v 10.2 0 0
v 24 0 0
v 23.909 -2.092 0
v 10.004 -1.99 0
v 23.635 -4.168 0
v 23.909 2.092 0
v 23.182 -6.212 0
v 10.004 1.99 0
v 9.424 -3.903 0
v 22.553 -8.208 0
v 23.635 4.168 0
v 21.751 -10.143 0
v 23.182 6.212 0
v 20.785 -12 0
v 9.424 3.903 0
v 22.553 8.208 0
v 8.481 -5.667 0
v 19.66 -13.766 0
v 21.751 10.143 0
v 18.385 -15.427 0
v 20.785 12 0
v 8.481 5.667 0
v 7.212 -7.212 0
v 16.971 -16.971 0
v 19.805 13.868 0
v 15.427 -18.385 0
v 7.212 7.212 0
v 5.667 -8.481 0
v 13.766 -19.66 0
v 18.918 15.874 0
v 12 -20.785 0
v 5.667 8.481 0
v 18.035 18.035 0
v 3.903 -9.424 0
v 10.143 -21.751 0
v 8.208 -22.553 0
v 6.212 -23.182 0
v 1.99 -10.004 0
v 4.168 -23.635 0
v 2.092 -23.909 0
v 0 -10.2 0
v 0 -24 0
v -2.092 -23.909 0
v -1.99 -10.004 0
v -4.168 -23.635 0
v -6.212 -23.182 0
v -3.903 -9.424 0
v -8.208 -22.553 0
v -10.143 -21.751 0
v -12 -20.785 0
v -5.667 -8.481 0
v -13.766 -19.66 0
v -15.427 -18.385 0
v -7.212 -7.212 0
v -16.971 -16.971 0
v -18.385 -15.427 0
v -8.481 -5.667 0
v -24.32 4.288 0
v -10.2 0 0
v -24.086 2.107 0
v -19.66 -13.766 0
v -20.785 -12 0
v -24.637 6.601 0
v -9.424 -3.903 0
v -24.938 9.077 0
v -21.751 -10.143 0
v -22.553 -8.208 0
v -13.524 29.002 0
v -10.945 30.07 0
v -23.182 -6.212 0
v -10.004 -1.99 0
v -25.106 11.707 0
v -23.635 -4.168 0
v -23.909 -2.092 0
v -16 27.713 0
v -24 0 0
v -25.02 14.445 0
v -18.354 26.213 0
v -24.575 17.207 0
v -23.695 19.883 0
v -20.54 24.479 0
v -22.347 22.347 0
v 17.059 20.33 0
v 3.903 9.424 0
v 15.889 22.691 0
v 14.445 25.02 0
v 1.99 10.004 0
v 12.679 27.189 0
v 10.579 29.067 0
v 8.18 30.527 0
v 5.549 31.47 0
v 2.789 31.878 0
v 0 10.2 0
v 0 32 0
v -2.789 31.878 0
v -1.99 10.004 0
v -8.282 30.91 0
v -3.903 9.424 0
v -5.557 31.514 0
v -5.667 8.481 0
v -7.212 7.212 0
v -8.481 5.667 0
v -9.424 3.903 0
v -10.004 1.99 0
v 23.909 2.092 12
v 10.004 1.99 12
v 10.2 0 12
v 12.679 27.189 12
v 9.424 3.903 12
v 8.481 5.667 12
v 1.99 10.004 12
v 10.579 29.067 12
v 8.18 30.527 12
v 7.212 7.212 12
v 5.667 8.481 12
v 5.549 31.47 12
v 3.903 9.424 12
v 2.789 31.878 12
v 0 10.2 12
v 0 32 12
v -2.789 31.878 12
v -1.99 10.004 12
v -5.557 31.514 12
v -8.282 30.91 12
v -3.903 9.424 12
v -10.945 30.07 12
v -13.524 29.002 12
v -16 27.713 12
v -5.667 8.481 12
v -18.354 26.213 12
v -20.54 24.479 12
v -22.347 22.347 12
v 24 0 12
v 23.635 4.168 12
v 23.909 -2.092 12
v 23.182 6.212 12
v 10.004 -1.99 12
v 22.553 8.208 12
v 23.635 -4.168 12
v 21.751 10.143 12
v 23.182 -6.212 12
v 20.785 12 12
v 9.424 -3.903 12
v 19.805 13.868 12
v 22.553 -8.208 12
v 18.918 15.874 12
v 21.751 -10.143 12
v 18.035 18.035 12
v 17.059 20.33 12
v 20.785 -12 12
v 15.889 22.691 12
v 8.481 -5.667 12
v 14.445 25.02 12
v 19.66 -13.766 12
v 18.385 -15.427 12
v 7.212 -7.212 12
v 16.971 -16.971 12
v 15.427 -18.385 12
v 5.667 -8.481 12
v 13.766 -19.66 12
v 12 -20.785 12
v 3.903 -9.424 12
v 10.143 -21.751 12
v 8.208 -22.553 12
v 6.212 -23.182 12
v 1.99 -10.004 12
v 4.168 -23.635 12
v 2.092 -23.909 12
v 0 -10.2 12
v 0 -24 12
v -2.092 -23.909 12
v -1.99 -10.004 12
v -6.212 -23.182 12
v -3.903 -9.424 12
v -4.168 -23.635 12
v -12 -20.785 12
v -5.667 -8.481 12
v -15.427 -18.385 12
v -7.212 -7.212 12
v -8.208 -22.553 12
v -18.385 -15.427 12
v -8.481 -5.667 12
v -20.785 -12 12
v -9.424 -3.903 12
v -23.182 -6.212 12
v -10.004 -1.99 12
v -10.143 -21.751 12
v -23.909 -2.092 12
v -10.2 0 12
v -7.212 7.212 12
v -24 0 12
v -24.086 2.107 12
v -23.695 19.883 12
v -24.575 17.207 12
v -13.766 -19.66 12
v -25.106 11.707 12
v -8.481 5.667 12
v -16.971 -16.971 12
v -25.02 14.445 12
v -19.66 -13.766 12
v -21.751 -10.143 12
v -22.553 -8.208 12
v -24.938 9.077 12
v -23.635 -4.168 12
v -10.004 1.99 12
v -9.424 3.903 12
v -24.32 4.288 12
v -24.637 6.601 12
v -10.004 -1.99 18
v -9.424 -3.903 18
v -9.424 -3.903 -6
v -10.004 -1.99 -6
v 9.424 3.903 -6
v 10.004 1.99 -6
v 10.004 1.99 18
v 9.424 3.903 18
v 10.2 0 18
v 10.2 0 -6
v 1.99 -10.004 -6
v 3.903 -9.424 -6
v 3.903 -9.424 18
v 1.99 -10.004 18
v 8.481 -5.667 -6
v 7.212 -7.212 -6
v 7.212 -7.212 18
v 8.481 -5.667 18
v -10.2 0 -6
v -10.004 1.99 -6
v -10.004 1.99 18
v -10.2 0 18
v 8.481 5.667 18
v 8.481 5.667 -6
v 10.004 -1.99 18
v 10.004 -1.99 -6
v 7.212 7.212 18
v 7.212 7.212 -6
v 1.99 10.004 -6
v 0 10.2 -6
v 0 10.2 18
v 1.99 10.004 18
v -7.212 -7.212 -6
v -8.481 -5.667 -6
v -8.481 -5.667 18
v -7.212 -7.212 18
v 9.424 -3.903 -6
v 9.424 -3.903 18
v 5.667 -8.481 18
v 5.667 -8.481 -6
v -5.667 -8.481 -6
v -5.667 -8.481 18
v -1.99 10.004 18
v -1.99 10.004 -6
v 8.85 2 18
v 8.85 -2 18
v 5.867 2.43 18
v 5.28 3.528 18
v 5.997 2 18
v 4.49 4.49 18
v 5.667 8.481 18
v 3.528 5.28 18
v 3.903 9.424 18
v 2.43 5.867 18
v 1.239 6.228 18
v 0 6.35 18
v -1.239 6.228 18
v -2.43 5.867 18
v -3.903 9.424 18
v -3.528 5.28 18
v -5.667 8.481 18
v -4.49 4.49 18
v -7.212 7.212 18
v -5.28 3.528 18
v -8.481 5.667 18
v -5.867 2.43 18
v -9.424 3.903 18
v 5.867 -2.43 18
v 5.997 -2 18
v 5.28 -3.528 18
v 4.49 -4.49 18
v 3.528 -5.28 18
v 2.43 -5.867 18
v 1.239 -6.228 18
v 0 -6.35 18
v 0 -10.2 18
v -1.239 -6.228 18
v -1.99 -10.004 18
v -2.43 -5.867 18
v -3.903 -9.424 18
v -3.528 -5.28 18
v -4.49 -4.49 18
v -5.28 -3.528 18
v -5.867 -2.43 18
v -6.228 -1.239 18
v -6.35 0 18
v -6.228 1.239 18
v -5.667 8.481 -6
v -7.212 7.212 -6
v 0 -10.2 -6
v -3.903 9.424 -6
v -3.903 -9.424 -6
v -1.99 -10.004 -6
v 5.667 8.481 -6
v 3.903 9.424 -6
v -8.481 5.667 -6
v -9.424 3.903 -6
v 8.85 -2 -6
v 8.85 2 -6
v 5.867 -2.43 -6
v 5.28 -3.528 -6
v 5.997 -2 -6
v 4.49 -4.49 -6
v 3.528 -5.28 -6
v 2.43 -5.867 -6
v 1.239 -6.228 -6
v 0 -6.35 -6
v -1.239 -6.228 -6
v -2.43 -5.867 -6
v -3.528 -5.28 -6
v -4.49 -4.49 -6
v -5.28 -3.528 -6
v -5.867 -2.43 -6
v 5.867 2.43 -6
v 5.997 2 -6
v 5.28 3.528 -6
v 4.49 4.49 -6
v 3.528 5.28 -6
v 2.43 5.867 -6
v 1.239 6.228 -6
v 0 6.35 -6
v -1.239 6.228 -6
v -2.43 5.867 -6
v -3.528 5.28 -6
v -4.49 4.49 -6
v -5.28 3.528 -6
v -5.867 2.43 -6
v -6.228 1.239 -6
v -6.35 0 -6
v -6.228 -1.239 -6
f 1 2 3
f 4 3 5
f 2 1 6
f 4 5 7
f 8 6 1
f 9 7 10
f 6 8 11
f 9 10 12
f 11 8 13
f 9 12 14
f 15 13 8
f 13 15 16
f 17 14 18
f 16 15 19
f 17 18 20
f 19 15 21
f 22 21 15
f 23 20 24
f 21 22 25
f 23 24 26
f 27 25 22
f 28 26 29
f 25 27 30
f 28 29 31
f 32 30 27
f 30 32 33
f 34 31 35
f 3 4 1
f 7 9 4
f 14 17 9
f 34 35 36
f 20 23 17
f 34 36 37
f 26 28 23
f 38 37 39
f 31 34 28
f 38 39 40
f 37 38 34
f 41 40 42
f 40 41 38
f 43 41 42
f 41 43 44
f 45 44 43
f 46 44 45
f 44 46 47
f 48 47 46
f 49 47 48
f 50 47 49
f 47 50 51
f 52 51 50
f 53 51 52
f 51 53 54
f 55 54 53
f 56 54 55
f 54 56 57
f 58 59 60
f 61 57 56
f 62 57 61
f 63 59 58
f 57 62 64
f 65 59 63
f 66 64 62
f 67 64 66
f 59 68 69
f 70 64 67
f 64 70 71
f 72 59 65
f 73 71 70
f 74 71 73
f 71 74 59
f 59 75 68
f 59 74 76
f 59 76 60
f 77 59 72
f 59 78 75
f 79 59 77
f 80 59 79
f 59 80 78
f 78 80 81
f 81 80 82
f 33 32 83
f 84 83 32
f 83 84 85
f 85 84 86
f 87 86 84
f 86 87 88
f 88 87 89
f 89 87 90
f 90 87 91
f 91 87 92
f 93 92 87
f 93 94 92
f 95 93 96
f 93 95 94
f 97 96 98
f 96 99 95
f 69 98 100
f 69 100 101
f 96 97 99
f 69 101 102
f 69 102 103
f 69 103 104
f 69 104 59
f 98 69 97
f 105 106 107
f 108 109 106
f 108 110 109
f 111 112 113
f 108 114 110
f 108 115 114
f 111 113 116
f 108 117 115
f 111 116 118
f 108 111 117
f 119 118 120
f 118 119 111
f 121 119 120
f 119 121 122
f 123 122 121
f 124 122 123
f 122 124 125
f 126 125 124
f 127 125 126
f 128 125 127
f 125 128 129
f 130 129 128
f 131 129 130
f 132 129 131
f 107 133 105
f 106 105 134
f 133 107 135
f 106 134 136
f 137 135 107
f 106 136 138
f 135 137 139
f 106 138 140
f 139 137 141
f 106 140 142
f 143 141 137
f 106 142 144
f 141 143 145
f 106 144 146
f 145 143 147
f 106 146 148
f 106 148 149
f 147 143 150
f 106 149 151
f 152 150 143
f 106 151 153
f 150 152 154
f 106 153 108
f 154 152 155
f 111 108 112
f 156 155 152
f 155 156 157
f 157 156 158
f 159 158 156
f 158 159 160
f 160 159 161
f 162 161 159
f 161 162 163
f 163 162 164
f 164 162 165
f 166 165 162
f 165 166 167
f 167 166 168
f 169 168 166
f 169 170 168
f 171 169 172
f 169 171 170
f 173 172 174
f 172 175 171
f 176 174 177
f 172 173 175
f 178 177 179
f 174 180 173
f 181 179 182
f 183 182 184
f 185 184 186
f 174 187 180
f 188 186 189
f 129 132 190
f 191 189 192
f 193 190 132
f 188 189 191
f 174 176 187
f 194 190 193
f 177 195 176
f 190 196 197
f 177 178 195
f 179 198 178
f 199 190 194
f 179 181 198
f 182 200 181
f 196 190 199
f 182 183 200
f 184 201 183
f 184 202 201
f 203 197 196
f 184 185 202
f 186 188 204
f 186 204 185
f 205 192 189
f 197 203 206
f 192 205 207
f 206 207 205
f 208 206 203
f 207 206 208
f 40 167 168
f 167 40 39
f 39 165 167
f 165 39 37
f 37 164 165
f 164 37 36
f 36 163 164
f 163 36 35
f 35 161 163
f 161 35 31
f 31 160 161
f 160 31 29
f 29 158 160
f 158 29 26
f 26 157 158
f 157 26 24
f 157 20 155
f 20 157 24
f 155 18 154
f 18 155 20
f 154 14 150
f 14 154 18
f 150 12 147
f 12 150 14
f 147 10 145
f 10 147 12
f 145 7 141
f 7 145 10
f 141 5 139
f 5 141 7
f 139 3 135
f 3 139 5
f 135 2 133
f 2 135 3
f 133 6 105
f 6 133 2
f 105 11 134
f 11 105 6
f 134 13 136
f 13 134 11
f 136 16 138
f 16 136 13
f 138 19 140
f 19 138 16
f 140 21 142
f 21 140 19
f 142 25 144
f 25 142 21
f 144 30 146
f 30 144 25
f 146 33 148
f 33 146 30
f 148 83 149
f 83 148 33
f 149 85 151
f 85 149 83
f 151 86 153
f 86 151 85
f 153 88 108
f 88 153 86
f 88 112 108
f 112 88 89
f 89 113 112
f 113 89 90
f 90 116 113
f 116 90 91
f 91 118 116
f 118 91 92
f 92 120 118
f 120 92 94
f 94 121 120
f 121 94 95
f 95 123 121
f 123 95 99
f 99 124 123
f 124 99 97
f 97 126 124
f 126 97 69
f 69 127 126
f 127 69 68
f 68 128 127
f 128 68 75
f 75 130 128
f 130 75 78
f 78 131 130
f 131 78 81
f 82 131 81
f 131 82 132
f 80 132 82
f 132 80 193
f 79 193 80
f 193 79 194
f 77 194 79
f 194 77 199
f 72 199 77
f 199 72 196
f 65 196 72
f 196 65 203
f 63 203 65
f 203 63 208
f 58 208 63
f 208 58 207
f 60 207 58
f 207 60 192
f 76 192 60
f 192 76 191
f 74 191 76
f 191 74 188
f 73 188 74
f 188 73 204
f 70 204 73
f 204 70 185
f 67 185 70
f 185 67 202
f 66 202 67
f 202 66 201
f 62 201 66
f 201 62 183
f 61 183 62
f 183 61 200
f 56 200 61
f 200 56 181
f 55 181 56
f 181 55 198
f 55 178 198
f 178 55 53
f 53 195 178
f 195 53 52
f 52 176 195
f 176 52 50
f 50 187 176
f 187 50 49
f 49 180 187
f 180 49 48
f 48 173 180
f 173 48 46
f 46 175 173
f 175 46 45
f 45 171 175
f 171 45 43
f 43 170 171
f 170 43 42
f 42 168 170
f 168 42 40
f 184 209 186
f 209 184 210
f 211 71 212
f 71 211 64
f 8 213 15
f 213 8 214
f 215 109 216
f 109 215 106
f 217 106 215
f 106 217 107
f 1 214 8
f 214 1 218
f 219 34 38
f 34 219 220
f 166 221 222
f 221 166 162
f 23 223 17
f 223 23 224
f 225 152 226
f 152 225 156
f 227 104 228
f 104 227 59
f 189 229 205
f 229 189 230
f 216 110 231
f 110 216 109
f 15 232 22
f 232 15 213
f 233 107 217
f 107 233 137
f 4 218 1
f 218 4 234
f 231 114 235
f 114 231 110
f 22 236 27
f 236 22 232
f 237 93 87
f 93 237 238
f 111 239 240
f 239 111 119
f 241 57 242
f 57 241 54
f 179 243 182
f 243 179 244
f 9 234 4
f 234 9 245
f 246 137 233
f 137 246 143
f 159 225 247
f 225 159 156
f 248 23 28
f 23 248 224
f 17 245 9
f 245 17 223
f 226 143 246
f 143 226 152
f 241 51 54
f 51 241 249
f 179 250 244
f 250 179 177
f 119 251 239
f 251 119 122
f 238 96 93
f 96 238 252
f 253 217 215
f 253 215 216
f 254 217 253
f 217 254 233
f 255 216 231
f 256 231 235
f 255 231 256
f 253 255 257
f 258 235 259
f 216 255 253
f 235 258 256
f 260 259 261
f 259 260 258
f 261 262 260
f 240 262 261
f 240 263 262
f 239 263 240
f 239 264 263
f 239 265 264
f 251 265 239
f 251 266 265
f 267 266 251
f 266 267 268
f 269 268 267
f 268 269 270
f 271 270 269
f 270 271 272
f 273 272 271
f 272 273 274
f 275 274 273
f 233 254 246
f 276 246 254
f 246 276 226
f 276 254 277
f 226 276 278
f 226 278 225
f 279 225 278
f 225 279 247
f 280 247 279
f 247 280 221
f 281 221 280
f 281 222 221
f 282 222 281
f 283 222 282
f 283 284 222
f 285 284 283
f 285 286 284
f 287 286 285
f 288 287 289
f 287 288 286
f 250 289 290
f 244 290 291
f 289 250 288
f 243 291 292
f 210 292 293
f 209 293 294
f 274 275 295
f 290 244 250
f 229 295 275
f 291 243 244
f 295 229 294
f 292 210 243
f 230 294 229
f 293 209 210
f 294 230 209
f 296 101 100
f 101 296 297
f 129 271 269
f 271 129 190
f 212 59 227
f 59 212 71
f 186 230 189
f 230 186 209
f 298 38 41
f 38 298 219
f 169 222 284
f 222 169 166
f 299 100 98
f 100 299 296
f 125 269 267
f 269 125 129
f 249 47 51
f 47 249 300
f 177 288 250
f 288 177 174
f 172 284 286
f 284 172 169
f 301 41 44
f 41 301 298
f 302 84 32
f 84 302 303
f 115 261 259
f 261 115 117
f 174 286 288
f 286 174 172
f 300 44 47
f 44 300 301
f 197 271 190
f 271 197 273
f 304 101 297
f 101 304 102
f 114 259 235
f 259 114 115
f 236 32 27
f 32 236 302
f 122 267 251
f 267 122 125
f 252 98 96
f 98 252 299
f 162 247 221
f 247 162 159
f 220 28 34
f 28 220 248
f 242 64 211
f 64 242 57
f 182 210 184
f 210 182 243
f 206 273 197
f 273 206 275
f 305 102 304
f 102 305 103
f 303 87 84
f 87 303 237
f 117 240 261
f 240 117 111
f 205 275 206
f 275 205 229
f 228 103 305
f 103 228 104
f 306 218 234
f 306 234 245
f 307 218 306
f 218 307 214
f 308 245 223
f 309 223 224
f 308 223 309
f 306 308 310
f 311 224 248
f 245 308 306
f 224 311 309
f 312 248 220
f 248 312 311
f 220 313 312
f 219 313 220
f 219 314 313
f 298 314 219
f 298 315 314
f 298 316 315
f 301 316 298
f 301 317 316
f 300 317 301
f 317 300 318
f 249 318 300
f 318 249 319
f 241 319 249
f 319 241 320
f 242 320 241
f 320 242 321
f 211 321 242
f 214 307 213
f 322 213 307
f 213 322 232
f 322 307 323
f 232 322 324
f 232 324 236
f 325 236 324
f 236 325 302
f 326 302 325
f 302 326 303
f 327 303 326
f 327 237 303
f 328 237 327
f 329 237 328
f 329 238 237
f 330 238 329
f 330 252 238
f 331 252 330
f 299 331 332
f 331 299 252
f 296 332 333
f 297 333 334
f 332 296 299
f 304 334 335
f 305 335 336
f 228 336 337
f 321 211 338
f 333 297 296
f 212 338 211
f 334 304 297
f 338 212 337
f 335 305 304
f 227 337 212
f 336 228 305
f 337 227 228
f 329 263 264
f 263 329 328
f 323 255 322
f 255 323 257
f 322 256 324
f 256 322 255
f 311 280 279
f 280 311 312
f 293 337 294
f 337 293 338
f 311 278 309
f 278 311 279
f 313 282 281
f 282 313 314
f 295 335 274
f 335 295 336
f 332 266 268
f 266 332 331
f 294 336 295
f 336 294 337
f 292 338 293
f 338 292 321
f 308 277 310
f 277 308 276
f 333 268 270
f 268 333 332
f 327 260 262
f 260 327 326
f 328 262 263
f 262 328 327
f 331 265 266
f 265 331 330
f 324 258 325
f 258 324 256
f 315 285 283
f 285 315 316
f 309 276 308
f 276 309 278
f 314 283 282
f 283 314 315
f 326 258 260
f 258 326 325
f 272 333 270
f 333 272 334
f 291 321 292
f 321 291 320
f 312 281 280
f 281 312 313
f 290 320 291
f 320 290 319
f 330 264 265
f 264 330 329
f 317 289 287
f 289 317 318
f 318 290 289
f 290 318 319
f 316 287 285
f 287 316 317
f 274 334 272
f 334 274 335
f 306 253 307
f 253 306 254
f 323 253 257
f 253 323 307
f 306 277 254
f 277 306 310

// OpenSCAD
$fn = 32;

// ----------------------------------------------------------------------
// Cam: base radius 24 mm with a 8 mm lift over 150 degrees
// ----------------------------------------------------------------------

// --- parameters (mm) ---
base_r = 24;              // base radius
lift = 8;                 // lift height above the base radius
lift_span = 150;          // angular width of the lift
lift_start = 30;          // angle where the lift starts
cam_t = 12;               // cam plate thickness
hub_d = 20.4;             // hub diameter
hub_h = 24;               // hub height
bore_d = 12.7;            // bore
key_w = 4;                // keyway width
key_depth = 1.85;         // keyway depth

cam_profile = [[24, 0], [23.909, 2.092], [23.635, 4.168], [23.182, 6.212], [22.553, 8.208], [21.751, 10.143], [20.785, 12], [19.805, 13.868], [18.918, 15.874], [18.035, 18.035], [17.059, 20.33], [15.889, 22.691], [14.445, 25.02], [12.679, 27.189], [10.579, 29.067], [8.18, 30.527], [5.549, 31.47], [2.789, 31.878], [0, 32], [-2.789, 31.878], [-5.557, 31.514], [-8.282, 30.91], [-10.945, 30.07], [-13.524, 29.002], [-16, 27.713], [-18.354, 26.213], [-20.54, 24.479], [-22.347, 22.347], [-23.695, 19.883], [-24.575, 17.207], [-25.02, 14.445], [-25.106, 11.707], [-24.938, 9.077], [-24.637, 6.601], [-24.32, 4.288], [-24.086, 2.107], [-24, 0], [-23.909, -2.092], [-23.635, -4.168], [-23.182, -6.212], [-22.553, -8.208], [-21.751, -10.143], [-20.785, -12], [-19.66, -13.766], [-18.385, -15.427], [-16.971, -16.971], [-15.427, -18.385], [-13.766, -19.66], [-12, -20.785], [-10.143, -21.751], [-8.208, -22.553], [-6.212, -23.182], [-4.168, -23.635], [-2.092, -23.909], [0, -24], [2.092, -23.909], [4.168, -23.635], [6.212, -23.182], [8.208, -22.553], [10.143, -21.751], [12, -20.785], [13.766, -19.66], [15.427, -18.385], [16.971, -16.971], [18.385, -15.427], [19.66, -13.766], [20.785, -12], [21.751, -10.143], [22.553, -8.208], [23.182, -6.212], [23.635, -4.168], [23.909, -2.092]];

difference() {
  union() {
    linear_extrude(height = cam_t) polygon(cam_profile);
    /* hub, proud of the cam plate on both sides */
    translate([0, 0, -6]) cylinder(h = hub_h, d = hub_d);
  }
  /* bore through the hub, 2.5 mm clear on both faces */
  translate([0, 0, -8.5]) cylinder(h = hub_h + 5, d = bore_d);
  /* keyway, milled through the whole hub */
  translate([4.5, -2, -8.5]) cube([4.35, 4, 29]);
}
